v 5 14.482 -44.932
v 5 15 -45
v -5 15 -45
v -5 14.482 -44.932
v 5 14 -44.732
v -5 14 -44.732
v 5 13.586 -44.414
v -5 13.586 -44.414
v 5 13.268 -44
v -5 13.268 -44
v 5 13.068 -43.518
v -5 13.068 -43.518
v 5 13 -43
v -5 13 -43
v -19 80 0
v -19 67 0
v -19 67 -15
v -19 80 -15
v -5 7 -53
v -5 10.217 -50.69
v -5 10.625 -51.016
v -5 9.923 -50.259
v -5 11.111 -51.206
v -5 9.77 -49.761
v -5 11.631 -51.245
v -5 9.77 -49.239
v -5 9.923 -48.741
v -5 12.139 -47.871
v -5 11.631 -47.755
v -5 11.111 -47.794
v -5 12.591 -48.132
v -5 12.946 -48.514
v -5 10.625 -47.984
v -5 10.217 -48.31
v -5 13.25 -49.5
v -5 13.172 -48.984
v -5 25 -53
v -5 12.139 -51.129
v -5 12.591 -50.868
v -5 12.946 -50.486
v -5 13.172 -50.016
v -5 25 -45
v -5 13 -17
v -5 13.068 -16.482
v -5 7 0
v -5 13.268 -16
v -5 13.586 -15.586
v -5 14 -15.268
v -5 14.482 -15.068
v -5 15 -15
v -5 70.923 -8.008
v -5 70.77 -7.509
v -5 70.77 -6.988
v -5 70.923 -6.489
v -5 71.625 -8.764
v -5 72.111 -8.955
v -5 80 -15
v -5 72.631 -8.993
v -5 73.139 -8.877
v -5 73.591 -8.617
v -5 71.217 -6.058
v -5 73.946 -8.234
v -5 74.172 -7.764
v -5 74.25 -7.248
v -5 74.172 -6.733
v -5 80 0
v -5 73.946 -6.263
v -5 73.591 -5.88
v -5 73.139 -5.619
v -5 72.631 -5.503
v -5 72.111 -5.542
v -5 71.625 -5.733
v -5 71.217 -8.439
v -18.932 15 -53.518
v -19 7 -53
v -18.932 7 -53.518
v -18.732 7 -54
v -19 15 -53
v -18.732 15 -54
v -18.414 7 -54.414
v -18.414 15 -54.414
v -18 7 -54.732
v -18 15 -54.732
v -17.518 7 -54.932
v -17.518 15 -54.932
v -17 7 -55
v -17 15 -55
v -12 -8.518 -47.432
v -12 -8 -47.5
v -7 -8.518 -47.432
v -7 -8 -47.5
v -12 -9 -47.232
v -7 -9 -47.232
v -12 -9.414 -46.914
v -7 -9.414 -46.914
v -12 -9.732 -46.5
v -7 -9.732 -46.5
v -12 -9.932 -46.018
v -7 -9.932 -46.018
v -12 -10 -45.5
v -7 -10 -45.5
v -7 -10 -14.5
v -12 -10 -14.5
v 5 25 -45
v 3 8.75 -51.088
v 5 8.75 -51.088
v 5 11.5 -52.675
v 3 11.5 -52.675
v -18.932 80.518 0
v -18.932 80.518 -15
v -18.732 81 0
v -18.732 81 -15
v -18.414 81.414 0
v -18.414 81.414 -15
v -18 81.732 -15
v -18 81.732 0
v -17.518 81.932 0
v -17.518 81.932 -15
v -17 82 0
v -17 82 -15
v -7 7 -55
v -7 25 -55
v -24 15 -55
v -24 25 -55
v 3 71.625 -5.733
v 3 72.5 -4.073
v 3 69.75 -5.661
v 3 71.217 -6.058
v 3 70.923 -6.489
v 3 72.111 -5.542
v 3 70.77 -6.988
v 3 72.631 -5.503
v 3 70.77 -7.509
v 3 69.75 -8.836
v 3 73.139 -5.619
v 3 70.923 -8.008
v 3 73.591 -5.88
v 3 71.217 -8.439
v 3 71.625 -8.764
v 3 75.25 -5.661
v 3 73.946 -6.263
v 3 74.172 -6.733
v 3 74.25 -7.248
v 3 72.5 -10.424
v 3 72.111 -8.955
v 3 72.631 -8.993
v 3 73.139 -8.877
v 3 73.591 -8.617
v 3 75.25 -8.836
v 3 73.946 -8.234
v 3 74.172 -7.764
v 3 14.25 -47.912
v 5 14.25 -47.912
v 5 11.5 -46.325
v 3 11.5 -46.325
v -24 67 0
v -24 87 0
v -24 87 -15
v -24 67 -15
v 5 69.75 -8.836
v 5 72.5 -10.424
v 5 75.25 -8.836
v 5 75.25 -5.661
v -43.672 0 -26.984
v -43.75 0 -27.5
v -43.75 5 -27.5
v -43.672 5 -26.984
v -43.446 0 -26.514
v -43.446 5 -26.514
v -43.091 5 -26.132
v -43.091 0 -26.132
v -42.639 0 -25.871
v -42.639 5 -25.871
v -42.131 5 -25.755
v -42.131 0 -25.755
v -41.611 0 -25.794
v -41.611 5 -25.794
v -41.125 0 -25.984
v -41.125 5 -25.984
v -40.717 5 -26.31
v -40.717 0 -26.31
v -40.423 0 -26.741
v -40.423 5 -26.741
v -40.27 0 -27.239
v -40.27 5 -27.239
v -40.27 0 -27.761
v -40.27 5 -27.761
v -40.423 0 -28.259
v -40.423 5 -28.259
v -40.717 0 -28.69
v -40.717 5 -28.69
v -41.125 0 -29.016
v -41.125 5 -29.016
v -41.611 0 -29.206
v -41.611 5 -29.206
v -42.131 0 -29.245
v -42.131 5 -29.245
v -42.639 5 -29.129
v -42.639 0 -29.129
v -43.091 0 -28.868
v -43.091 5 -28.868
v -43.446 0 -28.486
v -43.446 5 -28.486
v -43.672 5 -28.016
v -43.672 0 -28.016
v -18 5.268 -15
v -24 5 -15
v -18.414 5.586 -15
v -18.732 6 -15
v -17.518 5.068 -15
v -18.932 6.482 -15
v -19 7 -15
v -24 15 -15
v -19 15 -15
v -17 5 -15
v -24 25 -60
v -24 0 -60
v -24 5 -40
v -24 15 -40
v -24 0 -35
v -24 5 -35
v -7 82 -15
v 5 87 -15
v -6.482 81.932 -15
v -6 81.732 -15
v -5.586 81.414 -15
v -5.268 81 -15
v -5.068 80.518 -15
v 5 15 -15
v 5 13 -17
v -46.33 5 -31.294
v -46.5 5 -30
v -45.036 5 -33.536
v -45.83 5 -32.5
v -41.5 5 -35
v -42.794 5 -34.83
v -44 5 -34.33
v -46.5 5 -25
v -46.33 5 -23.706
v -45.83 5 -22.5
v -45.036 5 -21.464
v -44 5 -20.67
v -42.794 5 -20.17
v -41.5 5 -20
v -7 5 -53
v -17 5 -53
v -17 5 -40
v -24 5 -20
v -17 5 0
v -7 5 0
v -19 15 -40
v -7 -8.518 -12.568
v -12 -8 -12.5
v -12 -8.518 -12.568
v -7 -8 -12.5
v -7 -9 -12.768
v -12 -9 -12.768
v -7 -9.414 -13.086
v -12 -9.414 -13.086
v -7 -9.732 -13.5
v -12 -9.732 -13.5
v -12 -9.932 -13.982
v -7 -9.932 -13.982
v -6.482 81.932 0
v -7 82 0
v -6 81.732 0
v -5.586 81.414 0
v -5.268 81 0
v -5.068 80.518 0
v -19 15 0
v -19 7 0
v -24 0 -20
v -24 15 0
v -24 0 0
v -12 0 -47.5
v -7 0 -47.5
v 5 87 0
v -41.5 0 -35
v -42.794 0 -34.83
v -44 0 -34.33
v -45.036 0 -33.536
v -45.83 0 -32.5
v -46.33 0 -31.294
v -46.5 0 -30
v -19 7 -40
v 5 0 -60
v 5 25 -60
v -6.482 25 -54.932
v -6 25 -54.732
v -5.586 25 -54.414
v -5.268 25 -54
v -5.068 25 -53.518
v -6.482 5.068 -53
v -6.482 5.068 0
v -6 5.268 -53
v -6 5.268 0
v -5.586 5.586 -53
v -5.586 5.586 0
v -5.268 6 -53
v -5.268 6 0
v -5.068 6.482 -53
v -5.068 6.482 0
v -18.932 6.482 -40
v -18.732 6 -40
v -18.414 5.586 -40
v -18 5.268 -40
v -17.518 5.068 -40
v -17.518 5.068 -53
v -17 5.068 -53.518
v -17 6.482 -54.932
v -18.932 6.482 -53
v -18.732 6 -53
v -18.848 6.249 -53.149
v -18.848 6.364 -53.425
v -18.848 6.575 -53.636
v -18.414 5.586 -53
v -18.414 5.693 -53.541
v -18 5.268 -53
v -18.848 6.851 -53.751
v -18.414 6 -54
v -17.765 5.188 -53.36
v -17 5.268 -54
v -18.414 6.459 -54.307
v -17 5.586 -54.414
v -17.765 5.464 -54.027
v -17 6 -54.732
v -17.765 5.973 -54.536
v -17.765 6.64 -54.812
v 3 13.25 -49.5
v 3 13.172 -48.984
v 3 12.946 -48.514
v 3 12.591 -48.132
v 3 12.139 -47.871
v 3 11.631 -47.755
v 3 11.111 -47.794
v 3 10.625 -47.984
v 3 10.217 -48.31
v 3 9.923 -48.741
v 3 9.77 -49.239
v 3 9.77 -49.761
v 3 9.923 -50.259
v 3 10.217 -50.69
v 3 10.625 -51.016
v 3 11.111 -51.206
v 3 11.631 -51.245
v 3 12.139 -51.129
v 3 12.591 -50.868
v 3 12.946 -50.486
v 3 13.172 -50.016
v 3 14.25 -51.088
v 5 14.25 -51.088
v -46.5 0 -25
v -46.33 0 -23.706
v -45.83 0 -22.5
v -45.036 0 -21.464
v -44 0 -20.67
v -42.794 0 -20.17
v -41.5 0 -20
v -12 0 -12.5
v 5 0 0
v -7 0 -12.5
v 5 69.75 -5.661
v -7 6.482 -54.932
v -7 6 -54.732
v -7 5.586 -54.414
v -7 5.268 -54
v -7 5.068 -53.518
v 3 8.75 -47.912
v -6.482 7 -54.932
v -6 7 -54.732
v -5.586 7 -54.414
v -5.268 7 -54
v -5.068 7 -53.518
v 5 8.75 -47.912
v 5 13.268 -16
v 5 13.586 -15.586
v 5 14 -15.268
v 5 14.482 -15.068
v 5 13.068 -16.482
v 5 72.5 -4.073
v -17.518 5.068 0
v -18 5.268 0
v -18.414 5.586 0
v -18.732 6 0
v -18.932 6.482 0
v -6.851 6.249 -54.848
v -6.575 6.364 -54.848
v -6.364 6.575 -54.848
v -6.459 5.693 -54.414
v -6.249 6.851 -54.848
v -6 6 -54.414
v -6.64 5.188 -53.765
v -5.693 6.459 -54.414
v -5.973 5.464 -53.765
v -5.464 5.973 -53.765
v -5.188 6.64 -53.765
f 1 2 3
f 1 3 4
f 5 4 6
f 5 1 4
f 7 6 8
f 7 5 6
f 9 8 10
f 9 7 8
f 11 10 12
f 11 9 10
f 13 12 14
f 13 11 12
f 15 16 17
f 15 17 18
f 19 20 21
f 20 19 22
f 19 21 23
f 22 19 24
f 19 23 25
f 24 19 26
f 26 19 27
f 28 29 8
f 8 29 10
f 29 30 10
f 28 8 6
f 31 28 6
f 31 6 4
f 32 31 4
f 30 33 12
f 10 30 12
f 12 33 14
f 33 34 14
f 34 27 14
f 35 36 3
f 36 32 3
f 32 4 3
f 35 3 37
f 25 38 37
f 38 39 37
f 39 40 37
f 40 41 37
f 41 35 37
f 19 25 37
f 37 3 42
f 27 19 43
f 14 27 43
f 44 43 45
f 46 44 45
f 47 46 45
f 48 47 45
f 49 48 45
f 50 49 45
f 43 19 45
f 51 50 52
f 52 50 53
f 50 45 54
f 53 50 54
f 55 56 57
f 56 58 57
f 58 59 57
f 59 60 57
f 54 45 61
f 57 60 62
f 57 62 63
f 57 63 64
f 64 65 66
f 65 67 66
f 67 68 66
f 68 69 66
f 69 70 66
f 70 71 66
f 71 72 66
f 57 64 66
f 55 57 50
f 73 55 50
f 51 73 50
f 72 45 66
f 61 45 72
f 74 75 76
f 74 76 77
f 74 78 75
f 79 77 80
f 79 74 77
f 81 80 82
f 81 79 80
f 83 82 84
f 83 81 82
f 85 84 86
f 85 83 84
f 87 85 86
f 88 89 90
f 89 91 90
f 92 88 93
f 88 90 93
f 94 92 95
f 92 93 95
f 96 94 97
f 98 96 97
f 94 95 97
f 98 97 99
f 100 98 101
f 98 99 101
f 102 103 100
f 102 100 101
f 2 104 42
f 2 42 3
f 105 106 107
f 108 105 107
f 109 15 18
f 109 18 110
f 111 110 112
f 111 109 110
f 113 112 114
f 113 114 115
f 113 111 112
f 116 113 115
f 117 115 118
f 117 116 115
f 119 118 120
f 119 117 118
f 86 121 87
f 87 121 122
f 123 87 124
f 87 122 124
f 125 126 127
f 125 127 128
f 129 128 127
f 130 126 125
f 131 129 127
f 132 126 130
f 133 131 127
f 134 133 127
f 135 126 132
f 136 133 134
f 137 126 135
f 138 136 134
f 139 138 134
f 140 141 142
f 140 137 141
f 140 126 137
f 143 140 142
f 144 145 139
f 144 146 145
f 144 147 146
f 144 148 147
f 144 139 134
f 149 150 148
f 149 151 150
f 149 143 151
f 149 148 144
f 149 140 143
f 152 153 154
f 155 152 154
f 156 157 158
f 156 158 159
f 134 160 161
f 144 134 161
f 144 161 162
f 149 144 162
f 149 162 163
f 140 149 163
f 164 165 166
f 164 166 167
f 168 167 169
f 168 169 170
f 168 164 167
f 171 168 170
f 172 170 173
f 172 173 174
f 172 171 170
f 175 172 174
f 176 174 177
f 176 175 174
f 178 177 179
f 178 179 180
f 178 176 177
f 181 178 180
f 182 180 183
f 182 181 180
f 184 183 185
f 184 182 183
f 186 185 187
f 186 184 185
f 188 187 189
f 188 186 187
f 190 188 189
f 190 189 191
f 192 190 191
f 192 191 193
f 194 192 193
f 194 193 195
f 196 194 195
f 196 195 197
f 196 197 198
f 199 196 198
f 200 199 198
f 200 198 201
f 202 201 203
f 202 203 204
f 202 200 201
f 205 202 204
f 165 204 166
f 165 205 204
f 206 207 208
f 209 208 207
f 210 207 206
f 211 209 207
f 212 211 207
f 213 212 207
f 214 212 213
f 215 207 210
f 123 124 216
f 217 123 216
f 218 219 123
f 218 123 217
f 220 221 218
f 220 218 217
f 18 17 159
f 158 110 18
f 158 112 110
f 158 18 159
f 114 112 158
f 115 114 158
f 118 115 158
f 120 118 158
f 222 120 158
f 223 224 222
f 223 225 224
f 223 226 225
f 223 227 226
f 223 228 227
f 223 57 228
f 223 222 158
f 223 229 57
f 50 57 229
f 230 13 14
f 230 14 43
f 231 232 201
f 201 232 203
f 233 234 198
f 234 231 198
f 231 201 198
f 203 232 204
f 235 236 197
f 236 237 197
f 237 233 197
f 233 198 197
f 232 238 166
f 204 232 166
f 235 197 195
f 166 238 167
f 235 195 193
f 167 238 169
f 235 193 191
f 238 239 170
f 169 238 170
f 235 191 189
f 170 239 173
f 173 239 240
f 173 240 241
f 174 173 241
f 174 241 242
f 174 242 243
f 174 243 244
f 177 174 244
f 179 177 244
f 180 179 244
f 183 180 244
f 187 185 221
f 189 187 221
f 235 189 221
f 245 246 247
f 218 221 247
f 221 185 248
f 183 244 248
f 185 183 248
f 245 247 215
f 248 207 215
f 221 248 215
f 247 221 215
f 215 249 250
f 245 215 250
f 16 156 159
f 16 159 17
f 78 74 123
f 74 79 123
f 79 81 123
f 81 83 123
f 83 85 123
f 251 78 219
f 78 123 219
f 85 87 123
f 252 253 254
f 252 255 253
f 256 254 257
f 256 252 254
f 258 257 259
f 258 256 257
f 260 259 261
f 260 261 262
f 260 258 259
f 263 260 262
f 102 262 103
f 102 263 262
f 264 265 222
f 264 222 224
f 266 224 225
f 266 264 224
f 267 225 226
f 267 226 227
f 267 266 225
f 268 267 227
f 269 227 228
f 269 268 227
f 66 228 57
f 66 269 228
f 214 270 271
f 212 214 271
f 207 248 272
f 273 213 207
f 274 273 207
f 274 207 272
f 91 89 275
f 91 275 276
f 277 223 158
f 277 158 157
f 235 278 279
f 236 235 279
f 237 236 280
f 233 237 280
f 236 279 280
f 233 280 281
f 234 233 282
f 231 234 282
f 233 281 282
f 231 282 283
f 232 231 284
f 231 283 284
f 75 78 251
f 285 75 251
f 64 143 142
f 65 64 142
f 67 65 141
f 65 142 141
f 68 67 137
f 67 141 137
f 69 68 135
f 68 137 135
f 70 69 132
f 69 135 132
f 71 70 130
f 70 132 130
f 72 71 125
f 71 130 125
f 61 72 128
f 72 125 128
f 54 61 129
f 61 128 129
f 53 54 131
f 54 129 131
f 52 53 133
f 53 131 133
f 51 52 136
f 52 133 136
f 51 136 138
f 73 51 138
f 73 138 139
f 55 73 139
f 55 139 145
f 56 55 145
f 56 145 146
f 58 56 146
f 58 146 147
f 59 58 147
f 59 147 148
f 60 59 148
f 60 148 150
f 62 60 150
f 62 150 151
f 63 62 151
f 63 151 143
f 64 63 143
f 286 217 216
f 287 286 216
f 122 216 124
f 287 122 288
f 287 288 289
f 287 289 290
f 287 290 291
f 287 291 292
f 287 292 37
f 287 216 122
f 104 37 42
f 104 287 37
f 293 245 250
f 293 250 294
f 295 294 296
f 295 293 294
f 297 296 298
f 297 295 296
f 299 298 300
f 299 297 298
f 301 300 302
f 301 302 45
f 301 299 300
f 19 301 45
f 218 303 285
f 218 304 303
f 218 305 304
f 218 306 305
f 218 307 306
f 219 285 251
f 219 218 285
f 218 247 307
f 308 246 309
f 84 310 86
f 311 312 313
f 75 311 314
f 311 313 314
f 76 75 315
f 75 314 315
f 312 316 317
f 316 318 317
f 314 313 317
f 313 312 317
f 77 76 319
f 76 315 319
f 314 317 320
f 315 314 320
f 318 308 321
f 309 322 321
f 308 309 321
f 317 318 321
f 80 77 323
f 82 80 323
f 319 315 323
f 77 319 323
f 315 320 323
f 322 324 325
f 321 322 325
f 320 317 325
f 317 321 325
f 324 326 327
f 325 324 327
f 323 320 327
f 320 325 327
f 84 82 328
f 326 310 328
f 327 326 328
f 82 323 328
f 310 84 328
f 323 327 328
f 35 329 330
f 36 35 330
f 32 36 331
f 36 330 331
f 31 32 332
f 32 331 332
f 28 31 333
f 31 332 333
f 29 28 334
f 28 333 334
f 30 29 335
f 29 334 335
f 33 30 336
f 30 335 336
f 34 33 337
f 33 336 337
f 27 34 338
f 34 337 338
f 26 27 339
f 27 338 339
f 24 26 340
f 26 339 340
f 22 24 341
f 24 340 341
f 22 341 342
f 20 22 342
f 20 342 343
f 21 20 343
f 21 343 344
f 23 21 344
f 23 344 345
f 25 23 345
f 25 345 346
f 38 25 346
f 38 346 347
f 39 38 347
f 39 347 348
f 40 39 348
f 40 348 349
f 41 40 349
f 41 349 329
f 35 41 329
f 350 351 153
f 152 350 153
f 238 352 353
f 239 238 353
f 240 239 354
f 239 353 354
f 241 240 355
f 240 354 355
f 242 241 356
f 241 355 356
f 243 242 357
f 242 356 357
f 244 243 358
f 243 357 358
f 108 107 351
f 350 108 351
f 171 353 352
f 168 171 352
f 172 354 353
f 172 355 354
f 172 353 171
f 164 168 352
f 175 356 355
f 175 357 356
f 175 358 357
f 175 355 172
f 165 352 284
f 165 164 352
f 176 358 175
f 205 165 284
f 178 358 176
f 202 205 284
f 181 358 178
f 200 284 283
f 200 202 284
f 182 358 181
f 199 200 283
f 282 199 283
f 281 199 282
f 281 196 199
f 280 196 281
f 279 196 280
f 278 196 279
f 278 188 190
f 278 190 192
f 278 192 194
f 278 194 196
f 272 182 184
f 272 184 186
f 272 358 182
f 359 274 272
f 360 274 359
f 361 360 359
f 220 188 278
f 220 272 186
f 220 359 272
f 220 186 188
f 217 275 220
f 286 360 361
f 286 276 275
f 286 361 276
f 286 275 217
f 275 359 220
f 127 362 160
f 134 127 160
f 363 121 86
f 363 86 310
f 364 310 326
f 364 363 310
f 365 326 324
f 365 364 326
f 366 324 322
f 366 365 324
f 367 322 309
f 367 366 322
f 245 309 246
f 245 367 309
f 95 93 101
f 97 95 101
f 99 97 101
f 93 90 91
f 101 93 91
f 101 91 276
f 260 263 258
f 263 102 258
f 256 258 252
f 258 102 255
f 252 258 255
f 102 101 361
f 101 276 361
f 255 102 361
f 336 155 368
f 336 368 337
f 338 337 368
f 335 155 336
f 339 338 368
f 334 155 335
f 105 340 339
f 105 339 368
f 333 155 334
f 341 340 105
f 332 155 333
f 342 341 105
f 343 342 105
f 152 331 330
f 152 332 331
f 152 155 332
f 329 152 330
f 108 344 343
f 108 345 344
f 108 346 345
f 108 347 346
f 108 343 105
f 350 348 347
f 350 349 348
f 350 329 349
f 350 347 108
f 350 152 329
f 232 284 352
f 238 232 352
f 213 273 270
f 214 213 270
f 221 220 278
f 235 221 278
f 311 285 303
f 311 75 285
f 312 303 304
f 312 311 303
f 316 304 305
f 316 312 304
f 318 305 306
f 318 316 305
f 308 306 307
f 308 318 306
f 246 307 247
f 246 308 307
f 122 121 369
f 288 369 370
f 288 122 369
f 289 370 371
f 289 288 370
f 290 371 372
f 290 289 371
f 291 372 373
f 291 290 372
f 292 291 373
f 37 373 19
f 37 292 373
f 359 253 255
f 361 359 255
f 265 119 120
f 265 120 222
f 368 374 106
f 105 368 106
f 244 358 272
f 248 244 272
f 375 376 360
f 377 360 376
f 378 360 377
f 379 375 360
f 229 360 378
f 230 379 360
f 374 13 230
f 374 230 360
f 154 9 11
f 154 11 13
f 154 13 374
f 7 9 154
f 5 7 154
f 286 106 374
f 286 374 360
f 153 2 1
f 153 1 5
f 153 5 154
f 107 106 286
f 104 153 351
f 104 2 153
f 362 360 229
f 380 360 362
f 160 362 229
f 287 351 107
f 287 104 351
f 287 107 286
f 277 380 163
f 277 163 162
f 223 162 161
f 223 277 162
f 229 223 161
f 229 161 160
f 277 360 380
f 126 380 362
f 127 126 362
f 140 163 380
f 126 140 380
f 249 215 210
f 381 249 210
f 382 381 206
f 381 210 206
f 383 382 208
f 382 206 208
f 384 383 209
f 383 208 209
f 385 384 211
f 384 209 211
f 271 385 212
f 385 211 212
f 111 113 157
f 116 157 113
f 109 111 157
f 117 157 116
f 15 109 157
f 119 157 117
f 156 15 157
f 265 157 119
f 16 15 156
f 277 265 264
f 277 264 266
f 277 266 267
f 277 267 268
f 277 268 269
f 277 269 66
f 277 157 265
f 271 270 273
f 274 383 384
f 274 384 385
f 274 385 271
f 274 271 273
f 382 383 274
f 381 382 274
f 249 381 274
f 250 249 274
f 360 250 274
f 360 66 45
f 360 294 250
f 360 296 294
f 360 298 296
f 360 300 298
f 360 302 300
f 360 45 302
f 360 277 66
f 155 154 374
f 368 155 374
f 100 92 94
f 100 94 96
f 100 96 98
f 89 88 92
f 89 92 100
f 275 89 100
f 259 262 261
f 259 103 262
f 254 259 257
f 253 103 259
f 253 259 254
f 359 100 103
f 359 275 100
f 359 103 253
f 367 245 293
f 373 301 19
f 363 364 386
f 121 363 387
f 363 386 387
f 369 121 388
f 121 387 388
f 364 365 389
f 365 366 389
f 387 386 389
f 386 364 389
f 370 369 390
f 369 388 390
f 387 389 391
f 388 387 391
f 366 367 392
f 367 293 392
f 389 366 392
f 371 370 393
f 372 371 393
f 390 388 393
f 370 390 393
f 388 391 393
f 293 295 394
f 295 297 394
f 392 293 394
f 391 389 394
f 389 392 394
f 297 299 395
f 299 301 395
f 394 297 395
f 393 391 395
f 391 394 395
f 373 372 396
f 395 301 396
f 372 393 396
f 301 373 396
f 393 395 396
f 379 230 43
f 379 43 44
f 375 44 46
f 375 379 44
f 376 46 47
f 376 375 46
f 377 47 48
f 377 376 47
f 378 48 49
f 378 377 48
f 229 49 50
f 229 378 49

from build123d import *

# Parameters (mm, degrees)
BOSS_EXTRUDE1_DEPTH     = 15
BOSS_EXTRUDE2_DEPTH     = 60
SKETCH3_W               = 24
SKETCH3_H               = 25
BOSS_EXTRUDE3_DEPTH     = 5
FILLET1_R               = 2
CUT_EXTRUDE1_DEPTH      = 109.374351209
CUT_EXTRUDE1_DEPTH_BACK = 9
SKETCH5_W               = 30
SKETCH5_H               = 12
CUT_EXTRUDE2_DEPTH      = 9
FILLET2_R               = 2
FILLET3_R               = 2
FILLET4_R               = 2
SKETCH6_W               = 15
SKETCH6_H               = 10
BOSS_EXTRUDE4_DEPTH     = 5
FILLET5_R               = 2
BOSS_EXTRUDE6_START     = 5
BOSS_EXTRUDE6_DEPTH     = 5
SKETCH11_R              = 1.75
CUT_EXTRUDE6_DEPTH      = 17
CUT_EXTRUDE7_DEPTH      = 2
SKETCH16_R              = 1.75
BOSS_EXTRUDE7_DEPTH     = 5
SKETCH17_W              = 5
SKETCH17_H              = 35
BOSS_EXTRUDE8_DEPTH     = 10
FILLET6_R               = 2


with BuildPart() as part:
    # Sketch1 → Boss-Extrude1 (new body)
    with BuildSketch(Plane.XY):
        with BuildLine():
            Line((0, 0), (0, 87))
            Line((0, 87), (-24, 87))
            Line((-24, 87), (-24, 67))
            Line((-24, 67), (-19, 67))
            Line((-19, 67), (-19, 80))
            ThreePointArc((-19, 80), (-18.414213562, 81.414213562), (-17, 82))
            Line((-17, 82), (-7, 82))
            ThreePointArc((-7, 82), (-5.585786438, 81.414213562), (-5, 80))
            Line((-5, 80), (-5, 75.913258959))
            Line((-5, 75.913258959), (-5, 0))
            Line((-5, 0), (0, 0))
        make_face()
    extrude(amount=-BOSS_EXTRUDE1_DEPTH)

    # Sketch2 → Boss-Extrude2 (add)
    with BuildSketch(Plane.XY):
        Polygon((-5, 0), (-24, 0), (-24, 0.85250732), (-24, 15), (-19, 15), (-19, 5), (-5, 5), (-5, 25), (0, 25), (0, 0), align=None)
    extrude(amount=-BOSS_EXTRUDE2_DEPTH)

    # Sketch3 → Boss-Extrude3 (add)
    with BuildSketch(Plane(origin=(0, 0, -60), x_dir=(-1, 0, 0), z_dir=(0, 0, -1))):
        with Locations((12, 12.5)):
            Rectangle(SKETCH3_W, SKETCH3_H)
    extrude(amount=-BOSS_EXTRUDE3_DEPTH)

    # Fillet1
    fillet1_edges = [part.edges().sort_by_distance(p)[0] for p in [
        (-5, 5, -27.5),
        (-19, 5, -27.5),
    ]]
    fillet(fillet1_edges, radius=FILLET1_R)

    # Sketch4 → Cut-Extrude1 (cut, two sides: drawn at the far end of the back side and taken through both)
    with BuildSketch(Plane.ZY.offset(24).offset(-CUT_EXTRUDE1_DEPTH_BACK)):
        Polygon((-55, 206.20706388), (-55, 15), (-55, 5), (-15, 5), (-15, 15), (-15, 206.20706388), (-15, 588.62119164), (-55, 588.62119164), align=None)
    extrude(amount=CUT_EXTRUDE1_DEPTH + CUT_EXTRUDE1_DEPTH_BACK, mode=Mode.SUBTRACT)

    # Sketch5 → Cut-Extrude2 (cut)
    with BuildSketch(Plane.ZY.offset(5)):
        with Locations((-30, 19)):
            Rectangle(SKETCH5_W, SKETCH5_H)
    extrude(amount=-CUT_EXTRUDE2_DEPTH, mode=Mode.SUBTRACT)

    # Fillet2
    fillet2_edges = [part.edges().sort_by_distance(p)[0] for p in [
        (-5, 16, -55),
        (-15.5, 5, -55),
        (-5.585786438, 5.585786438, -55),
    ]]
    fillet(fillet2_edges, radius=FILLET2_R)

    # Fillet3
    fillet3_edges = [part.edges().sort_by_distance(p)[0] for p in [
        (-2.5, 13, -45),
    ]]
    fillet(fillet3_edges, radius=FILLET3_R)

    # Fillet4
    fillet4_edges = [part.edges().sort_by_distance(p)[0] for p in [
        (-2.5, 13, -15),
    ]]
    fillet(fillet4_edges, radius=FILLET4_R)

    # Sketch6 → Boss-Extrude4 (add)
    with BuildSketch(Plane.ZY.offset(24)):
        with Locations((-47.5, 10)):
            Rectangle(SKETCH6_W, SKETCH6_H)
    extrude(amount=-BOSS_EXTRUDE4_DEPTH)

    # Fillet5
    fillet5_edges = [part.edges().sort_by_distance(p)[0] for p in [
        (-19, 5.585786438, -54.414213562),
        (-19, 11, -55),
        (-19, 5, -46.5),
    ]]
    fillet(fillet5_edges, radius=FILLET5_R)

    # Sketch10 → Boss-Extrude6 (add)
    with BuildSketch(Plane(origin=(0, 0, 0), x_dir=(0, 0, -1), z_dir=(1, 0, 0)).offset(BOSS_EXTRUDE6_START)):
        with BuildLine():
            Line((43, 13), (17, 13))
            ThreePointArc((17, 13), (15.585786438, 13.585786438), (15, 15))
            Line((15, 15), (15, 87))
            Line((15, 87), (0, 87))
            Line((0, 87), (0, 0))
            Line((0, 0), (60, 0))
            Line((60, 0), (60, 25))
            Line((60, 25), (45, 25))
            Line((45, 25), (45, 15))
            ThreePointArc((45, 15), (44.414213562, 13.585786438), (43, 13))
        make_face()
    extrude(amount=-BOSS_EXTRUDE6_DEPTH)

    # Sketch11 → Cut-Extrude6 (cut)
    with BuildSketch(Plane(origin=(5, 0, 0), x_dir=(0, 0, -1), z_dir=(1, 0, 0))):
        with Locations(Location((49.5, 11.5, 0), (0, 0, 90))):
            Circle(SKETCH11_R)
        with Locations(Location((7.248390946, 72.5, 0), (0, 0, 90))):
            Circle(SKETCH11_R)
    extrude(amount=-CUT_EXTRUDE6_DEPTH, mode=Mode.SUBTRACT)

    # Sketch14 → Cut-Extrude7 (cut)
    with BuildSketch(Plane(origin=(5, 0, 0), x_dir=(0, 0, -1), z_dir=(1, 0, 0))):
        Polygon((10.423817427, 72.5), (8.836104186, 75.25), (5.660677706, 75.25), (4.072964465, 72.5), (5.660677706, 69.75), (8.836104186, 69.75), align=None)
        Polygon((52.675426481, 11.5), (51.08771324, 14.25), (47.91228676, 14.25), (46.324573519, 11.5), (47.91228676, 8.75), (51.08771324, 8.75), align=None)
    extrude(amount=-CUT_EXTRUDE7_DEPTH, mode=Mode.SUBTRACT)

    # Sketch16 → Boss-Extrude7 (add)
    with BuildSketch(Plane(origin=(0, 0, 0), x_dir=(1, 0, 0), z_dir=(0, 1, 0))):
        with BuildLine():
            Line((-24, 35), (-41.5, 35))
            ThreePointArc((-41.5, 35), (-45.035533906, 33.535533906), (-46.5, 30))
            Line((-46.5, 30), (-46.5, 25))
            ThreePointArc((-46.5, 25), (-45.035533906, 21.464466094), (-41.5, 20))
            Line((-41.5, 20), (-24, 20))
            Line((-24, 20), (-24, 35))
        make_face()
        with Locations(Location((-42, 27.5, 0), (0, 0, 180))):
            Circle(SKETCH16_R, mode=Mode.SUBTRACT)
    extrude(amount=BOSS_EXTRUDE7_DEPTH)

    # Sketch17 → Boss-Extrude8 (add)
    with BuildSketch(Plane.XZ):
        with Locations((-9.5, -30)):
            Rectangle(SKETCH17_W, SKETCH17_H)
    extrude(amount=BOSS_EXTRUDE8_DEPTH)

    # Fillet6
    fillet6_edges = [part.edges().sort_by_distance(p)[0] for p in [
        (-9.5, -10, -12.5),
        (-9.5, -10, -47.5),
    ]]
    fillet(fillet6_edges, radius=FILLET6_R)


solid = part.part
